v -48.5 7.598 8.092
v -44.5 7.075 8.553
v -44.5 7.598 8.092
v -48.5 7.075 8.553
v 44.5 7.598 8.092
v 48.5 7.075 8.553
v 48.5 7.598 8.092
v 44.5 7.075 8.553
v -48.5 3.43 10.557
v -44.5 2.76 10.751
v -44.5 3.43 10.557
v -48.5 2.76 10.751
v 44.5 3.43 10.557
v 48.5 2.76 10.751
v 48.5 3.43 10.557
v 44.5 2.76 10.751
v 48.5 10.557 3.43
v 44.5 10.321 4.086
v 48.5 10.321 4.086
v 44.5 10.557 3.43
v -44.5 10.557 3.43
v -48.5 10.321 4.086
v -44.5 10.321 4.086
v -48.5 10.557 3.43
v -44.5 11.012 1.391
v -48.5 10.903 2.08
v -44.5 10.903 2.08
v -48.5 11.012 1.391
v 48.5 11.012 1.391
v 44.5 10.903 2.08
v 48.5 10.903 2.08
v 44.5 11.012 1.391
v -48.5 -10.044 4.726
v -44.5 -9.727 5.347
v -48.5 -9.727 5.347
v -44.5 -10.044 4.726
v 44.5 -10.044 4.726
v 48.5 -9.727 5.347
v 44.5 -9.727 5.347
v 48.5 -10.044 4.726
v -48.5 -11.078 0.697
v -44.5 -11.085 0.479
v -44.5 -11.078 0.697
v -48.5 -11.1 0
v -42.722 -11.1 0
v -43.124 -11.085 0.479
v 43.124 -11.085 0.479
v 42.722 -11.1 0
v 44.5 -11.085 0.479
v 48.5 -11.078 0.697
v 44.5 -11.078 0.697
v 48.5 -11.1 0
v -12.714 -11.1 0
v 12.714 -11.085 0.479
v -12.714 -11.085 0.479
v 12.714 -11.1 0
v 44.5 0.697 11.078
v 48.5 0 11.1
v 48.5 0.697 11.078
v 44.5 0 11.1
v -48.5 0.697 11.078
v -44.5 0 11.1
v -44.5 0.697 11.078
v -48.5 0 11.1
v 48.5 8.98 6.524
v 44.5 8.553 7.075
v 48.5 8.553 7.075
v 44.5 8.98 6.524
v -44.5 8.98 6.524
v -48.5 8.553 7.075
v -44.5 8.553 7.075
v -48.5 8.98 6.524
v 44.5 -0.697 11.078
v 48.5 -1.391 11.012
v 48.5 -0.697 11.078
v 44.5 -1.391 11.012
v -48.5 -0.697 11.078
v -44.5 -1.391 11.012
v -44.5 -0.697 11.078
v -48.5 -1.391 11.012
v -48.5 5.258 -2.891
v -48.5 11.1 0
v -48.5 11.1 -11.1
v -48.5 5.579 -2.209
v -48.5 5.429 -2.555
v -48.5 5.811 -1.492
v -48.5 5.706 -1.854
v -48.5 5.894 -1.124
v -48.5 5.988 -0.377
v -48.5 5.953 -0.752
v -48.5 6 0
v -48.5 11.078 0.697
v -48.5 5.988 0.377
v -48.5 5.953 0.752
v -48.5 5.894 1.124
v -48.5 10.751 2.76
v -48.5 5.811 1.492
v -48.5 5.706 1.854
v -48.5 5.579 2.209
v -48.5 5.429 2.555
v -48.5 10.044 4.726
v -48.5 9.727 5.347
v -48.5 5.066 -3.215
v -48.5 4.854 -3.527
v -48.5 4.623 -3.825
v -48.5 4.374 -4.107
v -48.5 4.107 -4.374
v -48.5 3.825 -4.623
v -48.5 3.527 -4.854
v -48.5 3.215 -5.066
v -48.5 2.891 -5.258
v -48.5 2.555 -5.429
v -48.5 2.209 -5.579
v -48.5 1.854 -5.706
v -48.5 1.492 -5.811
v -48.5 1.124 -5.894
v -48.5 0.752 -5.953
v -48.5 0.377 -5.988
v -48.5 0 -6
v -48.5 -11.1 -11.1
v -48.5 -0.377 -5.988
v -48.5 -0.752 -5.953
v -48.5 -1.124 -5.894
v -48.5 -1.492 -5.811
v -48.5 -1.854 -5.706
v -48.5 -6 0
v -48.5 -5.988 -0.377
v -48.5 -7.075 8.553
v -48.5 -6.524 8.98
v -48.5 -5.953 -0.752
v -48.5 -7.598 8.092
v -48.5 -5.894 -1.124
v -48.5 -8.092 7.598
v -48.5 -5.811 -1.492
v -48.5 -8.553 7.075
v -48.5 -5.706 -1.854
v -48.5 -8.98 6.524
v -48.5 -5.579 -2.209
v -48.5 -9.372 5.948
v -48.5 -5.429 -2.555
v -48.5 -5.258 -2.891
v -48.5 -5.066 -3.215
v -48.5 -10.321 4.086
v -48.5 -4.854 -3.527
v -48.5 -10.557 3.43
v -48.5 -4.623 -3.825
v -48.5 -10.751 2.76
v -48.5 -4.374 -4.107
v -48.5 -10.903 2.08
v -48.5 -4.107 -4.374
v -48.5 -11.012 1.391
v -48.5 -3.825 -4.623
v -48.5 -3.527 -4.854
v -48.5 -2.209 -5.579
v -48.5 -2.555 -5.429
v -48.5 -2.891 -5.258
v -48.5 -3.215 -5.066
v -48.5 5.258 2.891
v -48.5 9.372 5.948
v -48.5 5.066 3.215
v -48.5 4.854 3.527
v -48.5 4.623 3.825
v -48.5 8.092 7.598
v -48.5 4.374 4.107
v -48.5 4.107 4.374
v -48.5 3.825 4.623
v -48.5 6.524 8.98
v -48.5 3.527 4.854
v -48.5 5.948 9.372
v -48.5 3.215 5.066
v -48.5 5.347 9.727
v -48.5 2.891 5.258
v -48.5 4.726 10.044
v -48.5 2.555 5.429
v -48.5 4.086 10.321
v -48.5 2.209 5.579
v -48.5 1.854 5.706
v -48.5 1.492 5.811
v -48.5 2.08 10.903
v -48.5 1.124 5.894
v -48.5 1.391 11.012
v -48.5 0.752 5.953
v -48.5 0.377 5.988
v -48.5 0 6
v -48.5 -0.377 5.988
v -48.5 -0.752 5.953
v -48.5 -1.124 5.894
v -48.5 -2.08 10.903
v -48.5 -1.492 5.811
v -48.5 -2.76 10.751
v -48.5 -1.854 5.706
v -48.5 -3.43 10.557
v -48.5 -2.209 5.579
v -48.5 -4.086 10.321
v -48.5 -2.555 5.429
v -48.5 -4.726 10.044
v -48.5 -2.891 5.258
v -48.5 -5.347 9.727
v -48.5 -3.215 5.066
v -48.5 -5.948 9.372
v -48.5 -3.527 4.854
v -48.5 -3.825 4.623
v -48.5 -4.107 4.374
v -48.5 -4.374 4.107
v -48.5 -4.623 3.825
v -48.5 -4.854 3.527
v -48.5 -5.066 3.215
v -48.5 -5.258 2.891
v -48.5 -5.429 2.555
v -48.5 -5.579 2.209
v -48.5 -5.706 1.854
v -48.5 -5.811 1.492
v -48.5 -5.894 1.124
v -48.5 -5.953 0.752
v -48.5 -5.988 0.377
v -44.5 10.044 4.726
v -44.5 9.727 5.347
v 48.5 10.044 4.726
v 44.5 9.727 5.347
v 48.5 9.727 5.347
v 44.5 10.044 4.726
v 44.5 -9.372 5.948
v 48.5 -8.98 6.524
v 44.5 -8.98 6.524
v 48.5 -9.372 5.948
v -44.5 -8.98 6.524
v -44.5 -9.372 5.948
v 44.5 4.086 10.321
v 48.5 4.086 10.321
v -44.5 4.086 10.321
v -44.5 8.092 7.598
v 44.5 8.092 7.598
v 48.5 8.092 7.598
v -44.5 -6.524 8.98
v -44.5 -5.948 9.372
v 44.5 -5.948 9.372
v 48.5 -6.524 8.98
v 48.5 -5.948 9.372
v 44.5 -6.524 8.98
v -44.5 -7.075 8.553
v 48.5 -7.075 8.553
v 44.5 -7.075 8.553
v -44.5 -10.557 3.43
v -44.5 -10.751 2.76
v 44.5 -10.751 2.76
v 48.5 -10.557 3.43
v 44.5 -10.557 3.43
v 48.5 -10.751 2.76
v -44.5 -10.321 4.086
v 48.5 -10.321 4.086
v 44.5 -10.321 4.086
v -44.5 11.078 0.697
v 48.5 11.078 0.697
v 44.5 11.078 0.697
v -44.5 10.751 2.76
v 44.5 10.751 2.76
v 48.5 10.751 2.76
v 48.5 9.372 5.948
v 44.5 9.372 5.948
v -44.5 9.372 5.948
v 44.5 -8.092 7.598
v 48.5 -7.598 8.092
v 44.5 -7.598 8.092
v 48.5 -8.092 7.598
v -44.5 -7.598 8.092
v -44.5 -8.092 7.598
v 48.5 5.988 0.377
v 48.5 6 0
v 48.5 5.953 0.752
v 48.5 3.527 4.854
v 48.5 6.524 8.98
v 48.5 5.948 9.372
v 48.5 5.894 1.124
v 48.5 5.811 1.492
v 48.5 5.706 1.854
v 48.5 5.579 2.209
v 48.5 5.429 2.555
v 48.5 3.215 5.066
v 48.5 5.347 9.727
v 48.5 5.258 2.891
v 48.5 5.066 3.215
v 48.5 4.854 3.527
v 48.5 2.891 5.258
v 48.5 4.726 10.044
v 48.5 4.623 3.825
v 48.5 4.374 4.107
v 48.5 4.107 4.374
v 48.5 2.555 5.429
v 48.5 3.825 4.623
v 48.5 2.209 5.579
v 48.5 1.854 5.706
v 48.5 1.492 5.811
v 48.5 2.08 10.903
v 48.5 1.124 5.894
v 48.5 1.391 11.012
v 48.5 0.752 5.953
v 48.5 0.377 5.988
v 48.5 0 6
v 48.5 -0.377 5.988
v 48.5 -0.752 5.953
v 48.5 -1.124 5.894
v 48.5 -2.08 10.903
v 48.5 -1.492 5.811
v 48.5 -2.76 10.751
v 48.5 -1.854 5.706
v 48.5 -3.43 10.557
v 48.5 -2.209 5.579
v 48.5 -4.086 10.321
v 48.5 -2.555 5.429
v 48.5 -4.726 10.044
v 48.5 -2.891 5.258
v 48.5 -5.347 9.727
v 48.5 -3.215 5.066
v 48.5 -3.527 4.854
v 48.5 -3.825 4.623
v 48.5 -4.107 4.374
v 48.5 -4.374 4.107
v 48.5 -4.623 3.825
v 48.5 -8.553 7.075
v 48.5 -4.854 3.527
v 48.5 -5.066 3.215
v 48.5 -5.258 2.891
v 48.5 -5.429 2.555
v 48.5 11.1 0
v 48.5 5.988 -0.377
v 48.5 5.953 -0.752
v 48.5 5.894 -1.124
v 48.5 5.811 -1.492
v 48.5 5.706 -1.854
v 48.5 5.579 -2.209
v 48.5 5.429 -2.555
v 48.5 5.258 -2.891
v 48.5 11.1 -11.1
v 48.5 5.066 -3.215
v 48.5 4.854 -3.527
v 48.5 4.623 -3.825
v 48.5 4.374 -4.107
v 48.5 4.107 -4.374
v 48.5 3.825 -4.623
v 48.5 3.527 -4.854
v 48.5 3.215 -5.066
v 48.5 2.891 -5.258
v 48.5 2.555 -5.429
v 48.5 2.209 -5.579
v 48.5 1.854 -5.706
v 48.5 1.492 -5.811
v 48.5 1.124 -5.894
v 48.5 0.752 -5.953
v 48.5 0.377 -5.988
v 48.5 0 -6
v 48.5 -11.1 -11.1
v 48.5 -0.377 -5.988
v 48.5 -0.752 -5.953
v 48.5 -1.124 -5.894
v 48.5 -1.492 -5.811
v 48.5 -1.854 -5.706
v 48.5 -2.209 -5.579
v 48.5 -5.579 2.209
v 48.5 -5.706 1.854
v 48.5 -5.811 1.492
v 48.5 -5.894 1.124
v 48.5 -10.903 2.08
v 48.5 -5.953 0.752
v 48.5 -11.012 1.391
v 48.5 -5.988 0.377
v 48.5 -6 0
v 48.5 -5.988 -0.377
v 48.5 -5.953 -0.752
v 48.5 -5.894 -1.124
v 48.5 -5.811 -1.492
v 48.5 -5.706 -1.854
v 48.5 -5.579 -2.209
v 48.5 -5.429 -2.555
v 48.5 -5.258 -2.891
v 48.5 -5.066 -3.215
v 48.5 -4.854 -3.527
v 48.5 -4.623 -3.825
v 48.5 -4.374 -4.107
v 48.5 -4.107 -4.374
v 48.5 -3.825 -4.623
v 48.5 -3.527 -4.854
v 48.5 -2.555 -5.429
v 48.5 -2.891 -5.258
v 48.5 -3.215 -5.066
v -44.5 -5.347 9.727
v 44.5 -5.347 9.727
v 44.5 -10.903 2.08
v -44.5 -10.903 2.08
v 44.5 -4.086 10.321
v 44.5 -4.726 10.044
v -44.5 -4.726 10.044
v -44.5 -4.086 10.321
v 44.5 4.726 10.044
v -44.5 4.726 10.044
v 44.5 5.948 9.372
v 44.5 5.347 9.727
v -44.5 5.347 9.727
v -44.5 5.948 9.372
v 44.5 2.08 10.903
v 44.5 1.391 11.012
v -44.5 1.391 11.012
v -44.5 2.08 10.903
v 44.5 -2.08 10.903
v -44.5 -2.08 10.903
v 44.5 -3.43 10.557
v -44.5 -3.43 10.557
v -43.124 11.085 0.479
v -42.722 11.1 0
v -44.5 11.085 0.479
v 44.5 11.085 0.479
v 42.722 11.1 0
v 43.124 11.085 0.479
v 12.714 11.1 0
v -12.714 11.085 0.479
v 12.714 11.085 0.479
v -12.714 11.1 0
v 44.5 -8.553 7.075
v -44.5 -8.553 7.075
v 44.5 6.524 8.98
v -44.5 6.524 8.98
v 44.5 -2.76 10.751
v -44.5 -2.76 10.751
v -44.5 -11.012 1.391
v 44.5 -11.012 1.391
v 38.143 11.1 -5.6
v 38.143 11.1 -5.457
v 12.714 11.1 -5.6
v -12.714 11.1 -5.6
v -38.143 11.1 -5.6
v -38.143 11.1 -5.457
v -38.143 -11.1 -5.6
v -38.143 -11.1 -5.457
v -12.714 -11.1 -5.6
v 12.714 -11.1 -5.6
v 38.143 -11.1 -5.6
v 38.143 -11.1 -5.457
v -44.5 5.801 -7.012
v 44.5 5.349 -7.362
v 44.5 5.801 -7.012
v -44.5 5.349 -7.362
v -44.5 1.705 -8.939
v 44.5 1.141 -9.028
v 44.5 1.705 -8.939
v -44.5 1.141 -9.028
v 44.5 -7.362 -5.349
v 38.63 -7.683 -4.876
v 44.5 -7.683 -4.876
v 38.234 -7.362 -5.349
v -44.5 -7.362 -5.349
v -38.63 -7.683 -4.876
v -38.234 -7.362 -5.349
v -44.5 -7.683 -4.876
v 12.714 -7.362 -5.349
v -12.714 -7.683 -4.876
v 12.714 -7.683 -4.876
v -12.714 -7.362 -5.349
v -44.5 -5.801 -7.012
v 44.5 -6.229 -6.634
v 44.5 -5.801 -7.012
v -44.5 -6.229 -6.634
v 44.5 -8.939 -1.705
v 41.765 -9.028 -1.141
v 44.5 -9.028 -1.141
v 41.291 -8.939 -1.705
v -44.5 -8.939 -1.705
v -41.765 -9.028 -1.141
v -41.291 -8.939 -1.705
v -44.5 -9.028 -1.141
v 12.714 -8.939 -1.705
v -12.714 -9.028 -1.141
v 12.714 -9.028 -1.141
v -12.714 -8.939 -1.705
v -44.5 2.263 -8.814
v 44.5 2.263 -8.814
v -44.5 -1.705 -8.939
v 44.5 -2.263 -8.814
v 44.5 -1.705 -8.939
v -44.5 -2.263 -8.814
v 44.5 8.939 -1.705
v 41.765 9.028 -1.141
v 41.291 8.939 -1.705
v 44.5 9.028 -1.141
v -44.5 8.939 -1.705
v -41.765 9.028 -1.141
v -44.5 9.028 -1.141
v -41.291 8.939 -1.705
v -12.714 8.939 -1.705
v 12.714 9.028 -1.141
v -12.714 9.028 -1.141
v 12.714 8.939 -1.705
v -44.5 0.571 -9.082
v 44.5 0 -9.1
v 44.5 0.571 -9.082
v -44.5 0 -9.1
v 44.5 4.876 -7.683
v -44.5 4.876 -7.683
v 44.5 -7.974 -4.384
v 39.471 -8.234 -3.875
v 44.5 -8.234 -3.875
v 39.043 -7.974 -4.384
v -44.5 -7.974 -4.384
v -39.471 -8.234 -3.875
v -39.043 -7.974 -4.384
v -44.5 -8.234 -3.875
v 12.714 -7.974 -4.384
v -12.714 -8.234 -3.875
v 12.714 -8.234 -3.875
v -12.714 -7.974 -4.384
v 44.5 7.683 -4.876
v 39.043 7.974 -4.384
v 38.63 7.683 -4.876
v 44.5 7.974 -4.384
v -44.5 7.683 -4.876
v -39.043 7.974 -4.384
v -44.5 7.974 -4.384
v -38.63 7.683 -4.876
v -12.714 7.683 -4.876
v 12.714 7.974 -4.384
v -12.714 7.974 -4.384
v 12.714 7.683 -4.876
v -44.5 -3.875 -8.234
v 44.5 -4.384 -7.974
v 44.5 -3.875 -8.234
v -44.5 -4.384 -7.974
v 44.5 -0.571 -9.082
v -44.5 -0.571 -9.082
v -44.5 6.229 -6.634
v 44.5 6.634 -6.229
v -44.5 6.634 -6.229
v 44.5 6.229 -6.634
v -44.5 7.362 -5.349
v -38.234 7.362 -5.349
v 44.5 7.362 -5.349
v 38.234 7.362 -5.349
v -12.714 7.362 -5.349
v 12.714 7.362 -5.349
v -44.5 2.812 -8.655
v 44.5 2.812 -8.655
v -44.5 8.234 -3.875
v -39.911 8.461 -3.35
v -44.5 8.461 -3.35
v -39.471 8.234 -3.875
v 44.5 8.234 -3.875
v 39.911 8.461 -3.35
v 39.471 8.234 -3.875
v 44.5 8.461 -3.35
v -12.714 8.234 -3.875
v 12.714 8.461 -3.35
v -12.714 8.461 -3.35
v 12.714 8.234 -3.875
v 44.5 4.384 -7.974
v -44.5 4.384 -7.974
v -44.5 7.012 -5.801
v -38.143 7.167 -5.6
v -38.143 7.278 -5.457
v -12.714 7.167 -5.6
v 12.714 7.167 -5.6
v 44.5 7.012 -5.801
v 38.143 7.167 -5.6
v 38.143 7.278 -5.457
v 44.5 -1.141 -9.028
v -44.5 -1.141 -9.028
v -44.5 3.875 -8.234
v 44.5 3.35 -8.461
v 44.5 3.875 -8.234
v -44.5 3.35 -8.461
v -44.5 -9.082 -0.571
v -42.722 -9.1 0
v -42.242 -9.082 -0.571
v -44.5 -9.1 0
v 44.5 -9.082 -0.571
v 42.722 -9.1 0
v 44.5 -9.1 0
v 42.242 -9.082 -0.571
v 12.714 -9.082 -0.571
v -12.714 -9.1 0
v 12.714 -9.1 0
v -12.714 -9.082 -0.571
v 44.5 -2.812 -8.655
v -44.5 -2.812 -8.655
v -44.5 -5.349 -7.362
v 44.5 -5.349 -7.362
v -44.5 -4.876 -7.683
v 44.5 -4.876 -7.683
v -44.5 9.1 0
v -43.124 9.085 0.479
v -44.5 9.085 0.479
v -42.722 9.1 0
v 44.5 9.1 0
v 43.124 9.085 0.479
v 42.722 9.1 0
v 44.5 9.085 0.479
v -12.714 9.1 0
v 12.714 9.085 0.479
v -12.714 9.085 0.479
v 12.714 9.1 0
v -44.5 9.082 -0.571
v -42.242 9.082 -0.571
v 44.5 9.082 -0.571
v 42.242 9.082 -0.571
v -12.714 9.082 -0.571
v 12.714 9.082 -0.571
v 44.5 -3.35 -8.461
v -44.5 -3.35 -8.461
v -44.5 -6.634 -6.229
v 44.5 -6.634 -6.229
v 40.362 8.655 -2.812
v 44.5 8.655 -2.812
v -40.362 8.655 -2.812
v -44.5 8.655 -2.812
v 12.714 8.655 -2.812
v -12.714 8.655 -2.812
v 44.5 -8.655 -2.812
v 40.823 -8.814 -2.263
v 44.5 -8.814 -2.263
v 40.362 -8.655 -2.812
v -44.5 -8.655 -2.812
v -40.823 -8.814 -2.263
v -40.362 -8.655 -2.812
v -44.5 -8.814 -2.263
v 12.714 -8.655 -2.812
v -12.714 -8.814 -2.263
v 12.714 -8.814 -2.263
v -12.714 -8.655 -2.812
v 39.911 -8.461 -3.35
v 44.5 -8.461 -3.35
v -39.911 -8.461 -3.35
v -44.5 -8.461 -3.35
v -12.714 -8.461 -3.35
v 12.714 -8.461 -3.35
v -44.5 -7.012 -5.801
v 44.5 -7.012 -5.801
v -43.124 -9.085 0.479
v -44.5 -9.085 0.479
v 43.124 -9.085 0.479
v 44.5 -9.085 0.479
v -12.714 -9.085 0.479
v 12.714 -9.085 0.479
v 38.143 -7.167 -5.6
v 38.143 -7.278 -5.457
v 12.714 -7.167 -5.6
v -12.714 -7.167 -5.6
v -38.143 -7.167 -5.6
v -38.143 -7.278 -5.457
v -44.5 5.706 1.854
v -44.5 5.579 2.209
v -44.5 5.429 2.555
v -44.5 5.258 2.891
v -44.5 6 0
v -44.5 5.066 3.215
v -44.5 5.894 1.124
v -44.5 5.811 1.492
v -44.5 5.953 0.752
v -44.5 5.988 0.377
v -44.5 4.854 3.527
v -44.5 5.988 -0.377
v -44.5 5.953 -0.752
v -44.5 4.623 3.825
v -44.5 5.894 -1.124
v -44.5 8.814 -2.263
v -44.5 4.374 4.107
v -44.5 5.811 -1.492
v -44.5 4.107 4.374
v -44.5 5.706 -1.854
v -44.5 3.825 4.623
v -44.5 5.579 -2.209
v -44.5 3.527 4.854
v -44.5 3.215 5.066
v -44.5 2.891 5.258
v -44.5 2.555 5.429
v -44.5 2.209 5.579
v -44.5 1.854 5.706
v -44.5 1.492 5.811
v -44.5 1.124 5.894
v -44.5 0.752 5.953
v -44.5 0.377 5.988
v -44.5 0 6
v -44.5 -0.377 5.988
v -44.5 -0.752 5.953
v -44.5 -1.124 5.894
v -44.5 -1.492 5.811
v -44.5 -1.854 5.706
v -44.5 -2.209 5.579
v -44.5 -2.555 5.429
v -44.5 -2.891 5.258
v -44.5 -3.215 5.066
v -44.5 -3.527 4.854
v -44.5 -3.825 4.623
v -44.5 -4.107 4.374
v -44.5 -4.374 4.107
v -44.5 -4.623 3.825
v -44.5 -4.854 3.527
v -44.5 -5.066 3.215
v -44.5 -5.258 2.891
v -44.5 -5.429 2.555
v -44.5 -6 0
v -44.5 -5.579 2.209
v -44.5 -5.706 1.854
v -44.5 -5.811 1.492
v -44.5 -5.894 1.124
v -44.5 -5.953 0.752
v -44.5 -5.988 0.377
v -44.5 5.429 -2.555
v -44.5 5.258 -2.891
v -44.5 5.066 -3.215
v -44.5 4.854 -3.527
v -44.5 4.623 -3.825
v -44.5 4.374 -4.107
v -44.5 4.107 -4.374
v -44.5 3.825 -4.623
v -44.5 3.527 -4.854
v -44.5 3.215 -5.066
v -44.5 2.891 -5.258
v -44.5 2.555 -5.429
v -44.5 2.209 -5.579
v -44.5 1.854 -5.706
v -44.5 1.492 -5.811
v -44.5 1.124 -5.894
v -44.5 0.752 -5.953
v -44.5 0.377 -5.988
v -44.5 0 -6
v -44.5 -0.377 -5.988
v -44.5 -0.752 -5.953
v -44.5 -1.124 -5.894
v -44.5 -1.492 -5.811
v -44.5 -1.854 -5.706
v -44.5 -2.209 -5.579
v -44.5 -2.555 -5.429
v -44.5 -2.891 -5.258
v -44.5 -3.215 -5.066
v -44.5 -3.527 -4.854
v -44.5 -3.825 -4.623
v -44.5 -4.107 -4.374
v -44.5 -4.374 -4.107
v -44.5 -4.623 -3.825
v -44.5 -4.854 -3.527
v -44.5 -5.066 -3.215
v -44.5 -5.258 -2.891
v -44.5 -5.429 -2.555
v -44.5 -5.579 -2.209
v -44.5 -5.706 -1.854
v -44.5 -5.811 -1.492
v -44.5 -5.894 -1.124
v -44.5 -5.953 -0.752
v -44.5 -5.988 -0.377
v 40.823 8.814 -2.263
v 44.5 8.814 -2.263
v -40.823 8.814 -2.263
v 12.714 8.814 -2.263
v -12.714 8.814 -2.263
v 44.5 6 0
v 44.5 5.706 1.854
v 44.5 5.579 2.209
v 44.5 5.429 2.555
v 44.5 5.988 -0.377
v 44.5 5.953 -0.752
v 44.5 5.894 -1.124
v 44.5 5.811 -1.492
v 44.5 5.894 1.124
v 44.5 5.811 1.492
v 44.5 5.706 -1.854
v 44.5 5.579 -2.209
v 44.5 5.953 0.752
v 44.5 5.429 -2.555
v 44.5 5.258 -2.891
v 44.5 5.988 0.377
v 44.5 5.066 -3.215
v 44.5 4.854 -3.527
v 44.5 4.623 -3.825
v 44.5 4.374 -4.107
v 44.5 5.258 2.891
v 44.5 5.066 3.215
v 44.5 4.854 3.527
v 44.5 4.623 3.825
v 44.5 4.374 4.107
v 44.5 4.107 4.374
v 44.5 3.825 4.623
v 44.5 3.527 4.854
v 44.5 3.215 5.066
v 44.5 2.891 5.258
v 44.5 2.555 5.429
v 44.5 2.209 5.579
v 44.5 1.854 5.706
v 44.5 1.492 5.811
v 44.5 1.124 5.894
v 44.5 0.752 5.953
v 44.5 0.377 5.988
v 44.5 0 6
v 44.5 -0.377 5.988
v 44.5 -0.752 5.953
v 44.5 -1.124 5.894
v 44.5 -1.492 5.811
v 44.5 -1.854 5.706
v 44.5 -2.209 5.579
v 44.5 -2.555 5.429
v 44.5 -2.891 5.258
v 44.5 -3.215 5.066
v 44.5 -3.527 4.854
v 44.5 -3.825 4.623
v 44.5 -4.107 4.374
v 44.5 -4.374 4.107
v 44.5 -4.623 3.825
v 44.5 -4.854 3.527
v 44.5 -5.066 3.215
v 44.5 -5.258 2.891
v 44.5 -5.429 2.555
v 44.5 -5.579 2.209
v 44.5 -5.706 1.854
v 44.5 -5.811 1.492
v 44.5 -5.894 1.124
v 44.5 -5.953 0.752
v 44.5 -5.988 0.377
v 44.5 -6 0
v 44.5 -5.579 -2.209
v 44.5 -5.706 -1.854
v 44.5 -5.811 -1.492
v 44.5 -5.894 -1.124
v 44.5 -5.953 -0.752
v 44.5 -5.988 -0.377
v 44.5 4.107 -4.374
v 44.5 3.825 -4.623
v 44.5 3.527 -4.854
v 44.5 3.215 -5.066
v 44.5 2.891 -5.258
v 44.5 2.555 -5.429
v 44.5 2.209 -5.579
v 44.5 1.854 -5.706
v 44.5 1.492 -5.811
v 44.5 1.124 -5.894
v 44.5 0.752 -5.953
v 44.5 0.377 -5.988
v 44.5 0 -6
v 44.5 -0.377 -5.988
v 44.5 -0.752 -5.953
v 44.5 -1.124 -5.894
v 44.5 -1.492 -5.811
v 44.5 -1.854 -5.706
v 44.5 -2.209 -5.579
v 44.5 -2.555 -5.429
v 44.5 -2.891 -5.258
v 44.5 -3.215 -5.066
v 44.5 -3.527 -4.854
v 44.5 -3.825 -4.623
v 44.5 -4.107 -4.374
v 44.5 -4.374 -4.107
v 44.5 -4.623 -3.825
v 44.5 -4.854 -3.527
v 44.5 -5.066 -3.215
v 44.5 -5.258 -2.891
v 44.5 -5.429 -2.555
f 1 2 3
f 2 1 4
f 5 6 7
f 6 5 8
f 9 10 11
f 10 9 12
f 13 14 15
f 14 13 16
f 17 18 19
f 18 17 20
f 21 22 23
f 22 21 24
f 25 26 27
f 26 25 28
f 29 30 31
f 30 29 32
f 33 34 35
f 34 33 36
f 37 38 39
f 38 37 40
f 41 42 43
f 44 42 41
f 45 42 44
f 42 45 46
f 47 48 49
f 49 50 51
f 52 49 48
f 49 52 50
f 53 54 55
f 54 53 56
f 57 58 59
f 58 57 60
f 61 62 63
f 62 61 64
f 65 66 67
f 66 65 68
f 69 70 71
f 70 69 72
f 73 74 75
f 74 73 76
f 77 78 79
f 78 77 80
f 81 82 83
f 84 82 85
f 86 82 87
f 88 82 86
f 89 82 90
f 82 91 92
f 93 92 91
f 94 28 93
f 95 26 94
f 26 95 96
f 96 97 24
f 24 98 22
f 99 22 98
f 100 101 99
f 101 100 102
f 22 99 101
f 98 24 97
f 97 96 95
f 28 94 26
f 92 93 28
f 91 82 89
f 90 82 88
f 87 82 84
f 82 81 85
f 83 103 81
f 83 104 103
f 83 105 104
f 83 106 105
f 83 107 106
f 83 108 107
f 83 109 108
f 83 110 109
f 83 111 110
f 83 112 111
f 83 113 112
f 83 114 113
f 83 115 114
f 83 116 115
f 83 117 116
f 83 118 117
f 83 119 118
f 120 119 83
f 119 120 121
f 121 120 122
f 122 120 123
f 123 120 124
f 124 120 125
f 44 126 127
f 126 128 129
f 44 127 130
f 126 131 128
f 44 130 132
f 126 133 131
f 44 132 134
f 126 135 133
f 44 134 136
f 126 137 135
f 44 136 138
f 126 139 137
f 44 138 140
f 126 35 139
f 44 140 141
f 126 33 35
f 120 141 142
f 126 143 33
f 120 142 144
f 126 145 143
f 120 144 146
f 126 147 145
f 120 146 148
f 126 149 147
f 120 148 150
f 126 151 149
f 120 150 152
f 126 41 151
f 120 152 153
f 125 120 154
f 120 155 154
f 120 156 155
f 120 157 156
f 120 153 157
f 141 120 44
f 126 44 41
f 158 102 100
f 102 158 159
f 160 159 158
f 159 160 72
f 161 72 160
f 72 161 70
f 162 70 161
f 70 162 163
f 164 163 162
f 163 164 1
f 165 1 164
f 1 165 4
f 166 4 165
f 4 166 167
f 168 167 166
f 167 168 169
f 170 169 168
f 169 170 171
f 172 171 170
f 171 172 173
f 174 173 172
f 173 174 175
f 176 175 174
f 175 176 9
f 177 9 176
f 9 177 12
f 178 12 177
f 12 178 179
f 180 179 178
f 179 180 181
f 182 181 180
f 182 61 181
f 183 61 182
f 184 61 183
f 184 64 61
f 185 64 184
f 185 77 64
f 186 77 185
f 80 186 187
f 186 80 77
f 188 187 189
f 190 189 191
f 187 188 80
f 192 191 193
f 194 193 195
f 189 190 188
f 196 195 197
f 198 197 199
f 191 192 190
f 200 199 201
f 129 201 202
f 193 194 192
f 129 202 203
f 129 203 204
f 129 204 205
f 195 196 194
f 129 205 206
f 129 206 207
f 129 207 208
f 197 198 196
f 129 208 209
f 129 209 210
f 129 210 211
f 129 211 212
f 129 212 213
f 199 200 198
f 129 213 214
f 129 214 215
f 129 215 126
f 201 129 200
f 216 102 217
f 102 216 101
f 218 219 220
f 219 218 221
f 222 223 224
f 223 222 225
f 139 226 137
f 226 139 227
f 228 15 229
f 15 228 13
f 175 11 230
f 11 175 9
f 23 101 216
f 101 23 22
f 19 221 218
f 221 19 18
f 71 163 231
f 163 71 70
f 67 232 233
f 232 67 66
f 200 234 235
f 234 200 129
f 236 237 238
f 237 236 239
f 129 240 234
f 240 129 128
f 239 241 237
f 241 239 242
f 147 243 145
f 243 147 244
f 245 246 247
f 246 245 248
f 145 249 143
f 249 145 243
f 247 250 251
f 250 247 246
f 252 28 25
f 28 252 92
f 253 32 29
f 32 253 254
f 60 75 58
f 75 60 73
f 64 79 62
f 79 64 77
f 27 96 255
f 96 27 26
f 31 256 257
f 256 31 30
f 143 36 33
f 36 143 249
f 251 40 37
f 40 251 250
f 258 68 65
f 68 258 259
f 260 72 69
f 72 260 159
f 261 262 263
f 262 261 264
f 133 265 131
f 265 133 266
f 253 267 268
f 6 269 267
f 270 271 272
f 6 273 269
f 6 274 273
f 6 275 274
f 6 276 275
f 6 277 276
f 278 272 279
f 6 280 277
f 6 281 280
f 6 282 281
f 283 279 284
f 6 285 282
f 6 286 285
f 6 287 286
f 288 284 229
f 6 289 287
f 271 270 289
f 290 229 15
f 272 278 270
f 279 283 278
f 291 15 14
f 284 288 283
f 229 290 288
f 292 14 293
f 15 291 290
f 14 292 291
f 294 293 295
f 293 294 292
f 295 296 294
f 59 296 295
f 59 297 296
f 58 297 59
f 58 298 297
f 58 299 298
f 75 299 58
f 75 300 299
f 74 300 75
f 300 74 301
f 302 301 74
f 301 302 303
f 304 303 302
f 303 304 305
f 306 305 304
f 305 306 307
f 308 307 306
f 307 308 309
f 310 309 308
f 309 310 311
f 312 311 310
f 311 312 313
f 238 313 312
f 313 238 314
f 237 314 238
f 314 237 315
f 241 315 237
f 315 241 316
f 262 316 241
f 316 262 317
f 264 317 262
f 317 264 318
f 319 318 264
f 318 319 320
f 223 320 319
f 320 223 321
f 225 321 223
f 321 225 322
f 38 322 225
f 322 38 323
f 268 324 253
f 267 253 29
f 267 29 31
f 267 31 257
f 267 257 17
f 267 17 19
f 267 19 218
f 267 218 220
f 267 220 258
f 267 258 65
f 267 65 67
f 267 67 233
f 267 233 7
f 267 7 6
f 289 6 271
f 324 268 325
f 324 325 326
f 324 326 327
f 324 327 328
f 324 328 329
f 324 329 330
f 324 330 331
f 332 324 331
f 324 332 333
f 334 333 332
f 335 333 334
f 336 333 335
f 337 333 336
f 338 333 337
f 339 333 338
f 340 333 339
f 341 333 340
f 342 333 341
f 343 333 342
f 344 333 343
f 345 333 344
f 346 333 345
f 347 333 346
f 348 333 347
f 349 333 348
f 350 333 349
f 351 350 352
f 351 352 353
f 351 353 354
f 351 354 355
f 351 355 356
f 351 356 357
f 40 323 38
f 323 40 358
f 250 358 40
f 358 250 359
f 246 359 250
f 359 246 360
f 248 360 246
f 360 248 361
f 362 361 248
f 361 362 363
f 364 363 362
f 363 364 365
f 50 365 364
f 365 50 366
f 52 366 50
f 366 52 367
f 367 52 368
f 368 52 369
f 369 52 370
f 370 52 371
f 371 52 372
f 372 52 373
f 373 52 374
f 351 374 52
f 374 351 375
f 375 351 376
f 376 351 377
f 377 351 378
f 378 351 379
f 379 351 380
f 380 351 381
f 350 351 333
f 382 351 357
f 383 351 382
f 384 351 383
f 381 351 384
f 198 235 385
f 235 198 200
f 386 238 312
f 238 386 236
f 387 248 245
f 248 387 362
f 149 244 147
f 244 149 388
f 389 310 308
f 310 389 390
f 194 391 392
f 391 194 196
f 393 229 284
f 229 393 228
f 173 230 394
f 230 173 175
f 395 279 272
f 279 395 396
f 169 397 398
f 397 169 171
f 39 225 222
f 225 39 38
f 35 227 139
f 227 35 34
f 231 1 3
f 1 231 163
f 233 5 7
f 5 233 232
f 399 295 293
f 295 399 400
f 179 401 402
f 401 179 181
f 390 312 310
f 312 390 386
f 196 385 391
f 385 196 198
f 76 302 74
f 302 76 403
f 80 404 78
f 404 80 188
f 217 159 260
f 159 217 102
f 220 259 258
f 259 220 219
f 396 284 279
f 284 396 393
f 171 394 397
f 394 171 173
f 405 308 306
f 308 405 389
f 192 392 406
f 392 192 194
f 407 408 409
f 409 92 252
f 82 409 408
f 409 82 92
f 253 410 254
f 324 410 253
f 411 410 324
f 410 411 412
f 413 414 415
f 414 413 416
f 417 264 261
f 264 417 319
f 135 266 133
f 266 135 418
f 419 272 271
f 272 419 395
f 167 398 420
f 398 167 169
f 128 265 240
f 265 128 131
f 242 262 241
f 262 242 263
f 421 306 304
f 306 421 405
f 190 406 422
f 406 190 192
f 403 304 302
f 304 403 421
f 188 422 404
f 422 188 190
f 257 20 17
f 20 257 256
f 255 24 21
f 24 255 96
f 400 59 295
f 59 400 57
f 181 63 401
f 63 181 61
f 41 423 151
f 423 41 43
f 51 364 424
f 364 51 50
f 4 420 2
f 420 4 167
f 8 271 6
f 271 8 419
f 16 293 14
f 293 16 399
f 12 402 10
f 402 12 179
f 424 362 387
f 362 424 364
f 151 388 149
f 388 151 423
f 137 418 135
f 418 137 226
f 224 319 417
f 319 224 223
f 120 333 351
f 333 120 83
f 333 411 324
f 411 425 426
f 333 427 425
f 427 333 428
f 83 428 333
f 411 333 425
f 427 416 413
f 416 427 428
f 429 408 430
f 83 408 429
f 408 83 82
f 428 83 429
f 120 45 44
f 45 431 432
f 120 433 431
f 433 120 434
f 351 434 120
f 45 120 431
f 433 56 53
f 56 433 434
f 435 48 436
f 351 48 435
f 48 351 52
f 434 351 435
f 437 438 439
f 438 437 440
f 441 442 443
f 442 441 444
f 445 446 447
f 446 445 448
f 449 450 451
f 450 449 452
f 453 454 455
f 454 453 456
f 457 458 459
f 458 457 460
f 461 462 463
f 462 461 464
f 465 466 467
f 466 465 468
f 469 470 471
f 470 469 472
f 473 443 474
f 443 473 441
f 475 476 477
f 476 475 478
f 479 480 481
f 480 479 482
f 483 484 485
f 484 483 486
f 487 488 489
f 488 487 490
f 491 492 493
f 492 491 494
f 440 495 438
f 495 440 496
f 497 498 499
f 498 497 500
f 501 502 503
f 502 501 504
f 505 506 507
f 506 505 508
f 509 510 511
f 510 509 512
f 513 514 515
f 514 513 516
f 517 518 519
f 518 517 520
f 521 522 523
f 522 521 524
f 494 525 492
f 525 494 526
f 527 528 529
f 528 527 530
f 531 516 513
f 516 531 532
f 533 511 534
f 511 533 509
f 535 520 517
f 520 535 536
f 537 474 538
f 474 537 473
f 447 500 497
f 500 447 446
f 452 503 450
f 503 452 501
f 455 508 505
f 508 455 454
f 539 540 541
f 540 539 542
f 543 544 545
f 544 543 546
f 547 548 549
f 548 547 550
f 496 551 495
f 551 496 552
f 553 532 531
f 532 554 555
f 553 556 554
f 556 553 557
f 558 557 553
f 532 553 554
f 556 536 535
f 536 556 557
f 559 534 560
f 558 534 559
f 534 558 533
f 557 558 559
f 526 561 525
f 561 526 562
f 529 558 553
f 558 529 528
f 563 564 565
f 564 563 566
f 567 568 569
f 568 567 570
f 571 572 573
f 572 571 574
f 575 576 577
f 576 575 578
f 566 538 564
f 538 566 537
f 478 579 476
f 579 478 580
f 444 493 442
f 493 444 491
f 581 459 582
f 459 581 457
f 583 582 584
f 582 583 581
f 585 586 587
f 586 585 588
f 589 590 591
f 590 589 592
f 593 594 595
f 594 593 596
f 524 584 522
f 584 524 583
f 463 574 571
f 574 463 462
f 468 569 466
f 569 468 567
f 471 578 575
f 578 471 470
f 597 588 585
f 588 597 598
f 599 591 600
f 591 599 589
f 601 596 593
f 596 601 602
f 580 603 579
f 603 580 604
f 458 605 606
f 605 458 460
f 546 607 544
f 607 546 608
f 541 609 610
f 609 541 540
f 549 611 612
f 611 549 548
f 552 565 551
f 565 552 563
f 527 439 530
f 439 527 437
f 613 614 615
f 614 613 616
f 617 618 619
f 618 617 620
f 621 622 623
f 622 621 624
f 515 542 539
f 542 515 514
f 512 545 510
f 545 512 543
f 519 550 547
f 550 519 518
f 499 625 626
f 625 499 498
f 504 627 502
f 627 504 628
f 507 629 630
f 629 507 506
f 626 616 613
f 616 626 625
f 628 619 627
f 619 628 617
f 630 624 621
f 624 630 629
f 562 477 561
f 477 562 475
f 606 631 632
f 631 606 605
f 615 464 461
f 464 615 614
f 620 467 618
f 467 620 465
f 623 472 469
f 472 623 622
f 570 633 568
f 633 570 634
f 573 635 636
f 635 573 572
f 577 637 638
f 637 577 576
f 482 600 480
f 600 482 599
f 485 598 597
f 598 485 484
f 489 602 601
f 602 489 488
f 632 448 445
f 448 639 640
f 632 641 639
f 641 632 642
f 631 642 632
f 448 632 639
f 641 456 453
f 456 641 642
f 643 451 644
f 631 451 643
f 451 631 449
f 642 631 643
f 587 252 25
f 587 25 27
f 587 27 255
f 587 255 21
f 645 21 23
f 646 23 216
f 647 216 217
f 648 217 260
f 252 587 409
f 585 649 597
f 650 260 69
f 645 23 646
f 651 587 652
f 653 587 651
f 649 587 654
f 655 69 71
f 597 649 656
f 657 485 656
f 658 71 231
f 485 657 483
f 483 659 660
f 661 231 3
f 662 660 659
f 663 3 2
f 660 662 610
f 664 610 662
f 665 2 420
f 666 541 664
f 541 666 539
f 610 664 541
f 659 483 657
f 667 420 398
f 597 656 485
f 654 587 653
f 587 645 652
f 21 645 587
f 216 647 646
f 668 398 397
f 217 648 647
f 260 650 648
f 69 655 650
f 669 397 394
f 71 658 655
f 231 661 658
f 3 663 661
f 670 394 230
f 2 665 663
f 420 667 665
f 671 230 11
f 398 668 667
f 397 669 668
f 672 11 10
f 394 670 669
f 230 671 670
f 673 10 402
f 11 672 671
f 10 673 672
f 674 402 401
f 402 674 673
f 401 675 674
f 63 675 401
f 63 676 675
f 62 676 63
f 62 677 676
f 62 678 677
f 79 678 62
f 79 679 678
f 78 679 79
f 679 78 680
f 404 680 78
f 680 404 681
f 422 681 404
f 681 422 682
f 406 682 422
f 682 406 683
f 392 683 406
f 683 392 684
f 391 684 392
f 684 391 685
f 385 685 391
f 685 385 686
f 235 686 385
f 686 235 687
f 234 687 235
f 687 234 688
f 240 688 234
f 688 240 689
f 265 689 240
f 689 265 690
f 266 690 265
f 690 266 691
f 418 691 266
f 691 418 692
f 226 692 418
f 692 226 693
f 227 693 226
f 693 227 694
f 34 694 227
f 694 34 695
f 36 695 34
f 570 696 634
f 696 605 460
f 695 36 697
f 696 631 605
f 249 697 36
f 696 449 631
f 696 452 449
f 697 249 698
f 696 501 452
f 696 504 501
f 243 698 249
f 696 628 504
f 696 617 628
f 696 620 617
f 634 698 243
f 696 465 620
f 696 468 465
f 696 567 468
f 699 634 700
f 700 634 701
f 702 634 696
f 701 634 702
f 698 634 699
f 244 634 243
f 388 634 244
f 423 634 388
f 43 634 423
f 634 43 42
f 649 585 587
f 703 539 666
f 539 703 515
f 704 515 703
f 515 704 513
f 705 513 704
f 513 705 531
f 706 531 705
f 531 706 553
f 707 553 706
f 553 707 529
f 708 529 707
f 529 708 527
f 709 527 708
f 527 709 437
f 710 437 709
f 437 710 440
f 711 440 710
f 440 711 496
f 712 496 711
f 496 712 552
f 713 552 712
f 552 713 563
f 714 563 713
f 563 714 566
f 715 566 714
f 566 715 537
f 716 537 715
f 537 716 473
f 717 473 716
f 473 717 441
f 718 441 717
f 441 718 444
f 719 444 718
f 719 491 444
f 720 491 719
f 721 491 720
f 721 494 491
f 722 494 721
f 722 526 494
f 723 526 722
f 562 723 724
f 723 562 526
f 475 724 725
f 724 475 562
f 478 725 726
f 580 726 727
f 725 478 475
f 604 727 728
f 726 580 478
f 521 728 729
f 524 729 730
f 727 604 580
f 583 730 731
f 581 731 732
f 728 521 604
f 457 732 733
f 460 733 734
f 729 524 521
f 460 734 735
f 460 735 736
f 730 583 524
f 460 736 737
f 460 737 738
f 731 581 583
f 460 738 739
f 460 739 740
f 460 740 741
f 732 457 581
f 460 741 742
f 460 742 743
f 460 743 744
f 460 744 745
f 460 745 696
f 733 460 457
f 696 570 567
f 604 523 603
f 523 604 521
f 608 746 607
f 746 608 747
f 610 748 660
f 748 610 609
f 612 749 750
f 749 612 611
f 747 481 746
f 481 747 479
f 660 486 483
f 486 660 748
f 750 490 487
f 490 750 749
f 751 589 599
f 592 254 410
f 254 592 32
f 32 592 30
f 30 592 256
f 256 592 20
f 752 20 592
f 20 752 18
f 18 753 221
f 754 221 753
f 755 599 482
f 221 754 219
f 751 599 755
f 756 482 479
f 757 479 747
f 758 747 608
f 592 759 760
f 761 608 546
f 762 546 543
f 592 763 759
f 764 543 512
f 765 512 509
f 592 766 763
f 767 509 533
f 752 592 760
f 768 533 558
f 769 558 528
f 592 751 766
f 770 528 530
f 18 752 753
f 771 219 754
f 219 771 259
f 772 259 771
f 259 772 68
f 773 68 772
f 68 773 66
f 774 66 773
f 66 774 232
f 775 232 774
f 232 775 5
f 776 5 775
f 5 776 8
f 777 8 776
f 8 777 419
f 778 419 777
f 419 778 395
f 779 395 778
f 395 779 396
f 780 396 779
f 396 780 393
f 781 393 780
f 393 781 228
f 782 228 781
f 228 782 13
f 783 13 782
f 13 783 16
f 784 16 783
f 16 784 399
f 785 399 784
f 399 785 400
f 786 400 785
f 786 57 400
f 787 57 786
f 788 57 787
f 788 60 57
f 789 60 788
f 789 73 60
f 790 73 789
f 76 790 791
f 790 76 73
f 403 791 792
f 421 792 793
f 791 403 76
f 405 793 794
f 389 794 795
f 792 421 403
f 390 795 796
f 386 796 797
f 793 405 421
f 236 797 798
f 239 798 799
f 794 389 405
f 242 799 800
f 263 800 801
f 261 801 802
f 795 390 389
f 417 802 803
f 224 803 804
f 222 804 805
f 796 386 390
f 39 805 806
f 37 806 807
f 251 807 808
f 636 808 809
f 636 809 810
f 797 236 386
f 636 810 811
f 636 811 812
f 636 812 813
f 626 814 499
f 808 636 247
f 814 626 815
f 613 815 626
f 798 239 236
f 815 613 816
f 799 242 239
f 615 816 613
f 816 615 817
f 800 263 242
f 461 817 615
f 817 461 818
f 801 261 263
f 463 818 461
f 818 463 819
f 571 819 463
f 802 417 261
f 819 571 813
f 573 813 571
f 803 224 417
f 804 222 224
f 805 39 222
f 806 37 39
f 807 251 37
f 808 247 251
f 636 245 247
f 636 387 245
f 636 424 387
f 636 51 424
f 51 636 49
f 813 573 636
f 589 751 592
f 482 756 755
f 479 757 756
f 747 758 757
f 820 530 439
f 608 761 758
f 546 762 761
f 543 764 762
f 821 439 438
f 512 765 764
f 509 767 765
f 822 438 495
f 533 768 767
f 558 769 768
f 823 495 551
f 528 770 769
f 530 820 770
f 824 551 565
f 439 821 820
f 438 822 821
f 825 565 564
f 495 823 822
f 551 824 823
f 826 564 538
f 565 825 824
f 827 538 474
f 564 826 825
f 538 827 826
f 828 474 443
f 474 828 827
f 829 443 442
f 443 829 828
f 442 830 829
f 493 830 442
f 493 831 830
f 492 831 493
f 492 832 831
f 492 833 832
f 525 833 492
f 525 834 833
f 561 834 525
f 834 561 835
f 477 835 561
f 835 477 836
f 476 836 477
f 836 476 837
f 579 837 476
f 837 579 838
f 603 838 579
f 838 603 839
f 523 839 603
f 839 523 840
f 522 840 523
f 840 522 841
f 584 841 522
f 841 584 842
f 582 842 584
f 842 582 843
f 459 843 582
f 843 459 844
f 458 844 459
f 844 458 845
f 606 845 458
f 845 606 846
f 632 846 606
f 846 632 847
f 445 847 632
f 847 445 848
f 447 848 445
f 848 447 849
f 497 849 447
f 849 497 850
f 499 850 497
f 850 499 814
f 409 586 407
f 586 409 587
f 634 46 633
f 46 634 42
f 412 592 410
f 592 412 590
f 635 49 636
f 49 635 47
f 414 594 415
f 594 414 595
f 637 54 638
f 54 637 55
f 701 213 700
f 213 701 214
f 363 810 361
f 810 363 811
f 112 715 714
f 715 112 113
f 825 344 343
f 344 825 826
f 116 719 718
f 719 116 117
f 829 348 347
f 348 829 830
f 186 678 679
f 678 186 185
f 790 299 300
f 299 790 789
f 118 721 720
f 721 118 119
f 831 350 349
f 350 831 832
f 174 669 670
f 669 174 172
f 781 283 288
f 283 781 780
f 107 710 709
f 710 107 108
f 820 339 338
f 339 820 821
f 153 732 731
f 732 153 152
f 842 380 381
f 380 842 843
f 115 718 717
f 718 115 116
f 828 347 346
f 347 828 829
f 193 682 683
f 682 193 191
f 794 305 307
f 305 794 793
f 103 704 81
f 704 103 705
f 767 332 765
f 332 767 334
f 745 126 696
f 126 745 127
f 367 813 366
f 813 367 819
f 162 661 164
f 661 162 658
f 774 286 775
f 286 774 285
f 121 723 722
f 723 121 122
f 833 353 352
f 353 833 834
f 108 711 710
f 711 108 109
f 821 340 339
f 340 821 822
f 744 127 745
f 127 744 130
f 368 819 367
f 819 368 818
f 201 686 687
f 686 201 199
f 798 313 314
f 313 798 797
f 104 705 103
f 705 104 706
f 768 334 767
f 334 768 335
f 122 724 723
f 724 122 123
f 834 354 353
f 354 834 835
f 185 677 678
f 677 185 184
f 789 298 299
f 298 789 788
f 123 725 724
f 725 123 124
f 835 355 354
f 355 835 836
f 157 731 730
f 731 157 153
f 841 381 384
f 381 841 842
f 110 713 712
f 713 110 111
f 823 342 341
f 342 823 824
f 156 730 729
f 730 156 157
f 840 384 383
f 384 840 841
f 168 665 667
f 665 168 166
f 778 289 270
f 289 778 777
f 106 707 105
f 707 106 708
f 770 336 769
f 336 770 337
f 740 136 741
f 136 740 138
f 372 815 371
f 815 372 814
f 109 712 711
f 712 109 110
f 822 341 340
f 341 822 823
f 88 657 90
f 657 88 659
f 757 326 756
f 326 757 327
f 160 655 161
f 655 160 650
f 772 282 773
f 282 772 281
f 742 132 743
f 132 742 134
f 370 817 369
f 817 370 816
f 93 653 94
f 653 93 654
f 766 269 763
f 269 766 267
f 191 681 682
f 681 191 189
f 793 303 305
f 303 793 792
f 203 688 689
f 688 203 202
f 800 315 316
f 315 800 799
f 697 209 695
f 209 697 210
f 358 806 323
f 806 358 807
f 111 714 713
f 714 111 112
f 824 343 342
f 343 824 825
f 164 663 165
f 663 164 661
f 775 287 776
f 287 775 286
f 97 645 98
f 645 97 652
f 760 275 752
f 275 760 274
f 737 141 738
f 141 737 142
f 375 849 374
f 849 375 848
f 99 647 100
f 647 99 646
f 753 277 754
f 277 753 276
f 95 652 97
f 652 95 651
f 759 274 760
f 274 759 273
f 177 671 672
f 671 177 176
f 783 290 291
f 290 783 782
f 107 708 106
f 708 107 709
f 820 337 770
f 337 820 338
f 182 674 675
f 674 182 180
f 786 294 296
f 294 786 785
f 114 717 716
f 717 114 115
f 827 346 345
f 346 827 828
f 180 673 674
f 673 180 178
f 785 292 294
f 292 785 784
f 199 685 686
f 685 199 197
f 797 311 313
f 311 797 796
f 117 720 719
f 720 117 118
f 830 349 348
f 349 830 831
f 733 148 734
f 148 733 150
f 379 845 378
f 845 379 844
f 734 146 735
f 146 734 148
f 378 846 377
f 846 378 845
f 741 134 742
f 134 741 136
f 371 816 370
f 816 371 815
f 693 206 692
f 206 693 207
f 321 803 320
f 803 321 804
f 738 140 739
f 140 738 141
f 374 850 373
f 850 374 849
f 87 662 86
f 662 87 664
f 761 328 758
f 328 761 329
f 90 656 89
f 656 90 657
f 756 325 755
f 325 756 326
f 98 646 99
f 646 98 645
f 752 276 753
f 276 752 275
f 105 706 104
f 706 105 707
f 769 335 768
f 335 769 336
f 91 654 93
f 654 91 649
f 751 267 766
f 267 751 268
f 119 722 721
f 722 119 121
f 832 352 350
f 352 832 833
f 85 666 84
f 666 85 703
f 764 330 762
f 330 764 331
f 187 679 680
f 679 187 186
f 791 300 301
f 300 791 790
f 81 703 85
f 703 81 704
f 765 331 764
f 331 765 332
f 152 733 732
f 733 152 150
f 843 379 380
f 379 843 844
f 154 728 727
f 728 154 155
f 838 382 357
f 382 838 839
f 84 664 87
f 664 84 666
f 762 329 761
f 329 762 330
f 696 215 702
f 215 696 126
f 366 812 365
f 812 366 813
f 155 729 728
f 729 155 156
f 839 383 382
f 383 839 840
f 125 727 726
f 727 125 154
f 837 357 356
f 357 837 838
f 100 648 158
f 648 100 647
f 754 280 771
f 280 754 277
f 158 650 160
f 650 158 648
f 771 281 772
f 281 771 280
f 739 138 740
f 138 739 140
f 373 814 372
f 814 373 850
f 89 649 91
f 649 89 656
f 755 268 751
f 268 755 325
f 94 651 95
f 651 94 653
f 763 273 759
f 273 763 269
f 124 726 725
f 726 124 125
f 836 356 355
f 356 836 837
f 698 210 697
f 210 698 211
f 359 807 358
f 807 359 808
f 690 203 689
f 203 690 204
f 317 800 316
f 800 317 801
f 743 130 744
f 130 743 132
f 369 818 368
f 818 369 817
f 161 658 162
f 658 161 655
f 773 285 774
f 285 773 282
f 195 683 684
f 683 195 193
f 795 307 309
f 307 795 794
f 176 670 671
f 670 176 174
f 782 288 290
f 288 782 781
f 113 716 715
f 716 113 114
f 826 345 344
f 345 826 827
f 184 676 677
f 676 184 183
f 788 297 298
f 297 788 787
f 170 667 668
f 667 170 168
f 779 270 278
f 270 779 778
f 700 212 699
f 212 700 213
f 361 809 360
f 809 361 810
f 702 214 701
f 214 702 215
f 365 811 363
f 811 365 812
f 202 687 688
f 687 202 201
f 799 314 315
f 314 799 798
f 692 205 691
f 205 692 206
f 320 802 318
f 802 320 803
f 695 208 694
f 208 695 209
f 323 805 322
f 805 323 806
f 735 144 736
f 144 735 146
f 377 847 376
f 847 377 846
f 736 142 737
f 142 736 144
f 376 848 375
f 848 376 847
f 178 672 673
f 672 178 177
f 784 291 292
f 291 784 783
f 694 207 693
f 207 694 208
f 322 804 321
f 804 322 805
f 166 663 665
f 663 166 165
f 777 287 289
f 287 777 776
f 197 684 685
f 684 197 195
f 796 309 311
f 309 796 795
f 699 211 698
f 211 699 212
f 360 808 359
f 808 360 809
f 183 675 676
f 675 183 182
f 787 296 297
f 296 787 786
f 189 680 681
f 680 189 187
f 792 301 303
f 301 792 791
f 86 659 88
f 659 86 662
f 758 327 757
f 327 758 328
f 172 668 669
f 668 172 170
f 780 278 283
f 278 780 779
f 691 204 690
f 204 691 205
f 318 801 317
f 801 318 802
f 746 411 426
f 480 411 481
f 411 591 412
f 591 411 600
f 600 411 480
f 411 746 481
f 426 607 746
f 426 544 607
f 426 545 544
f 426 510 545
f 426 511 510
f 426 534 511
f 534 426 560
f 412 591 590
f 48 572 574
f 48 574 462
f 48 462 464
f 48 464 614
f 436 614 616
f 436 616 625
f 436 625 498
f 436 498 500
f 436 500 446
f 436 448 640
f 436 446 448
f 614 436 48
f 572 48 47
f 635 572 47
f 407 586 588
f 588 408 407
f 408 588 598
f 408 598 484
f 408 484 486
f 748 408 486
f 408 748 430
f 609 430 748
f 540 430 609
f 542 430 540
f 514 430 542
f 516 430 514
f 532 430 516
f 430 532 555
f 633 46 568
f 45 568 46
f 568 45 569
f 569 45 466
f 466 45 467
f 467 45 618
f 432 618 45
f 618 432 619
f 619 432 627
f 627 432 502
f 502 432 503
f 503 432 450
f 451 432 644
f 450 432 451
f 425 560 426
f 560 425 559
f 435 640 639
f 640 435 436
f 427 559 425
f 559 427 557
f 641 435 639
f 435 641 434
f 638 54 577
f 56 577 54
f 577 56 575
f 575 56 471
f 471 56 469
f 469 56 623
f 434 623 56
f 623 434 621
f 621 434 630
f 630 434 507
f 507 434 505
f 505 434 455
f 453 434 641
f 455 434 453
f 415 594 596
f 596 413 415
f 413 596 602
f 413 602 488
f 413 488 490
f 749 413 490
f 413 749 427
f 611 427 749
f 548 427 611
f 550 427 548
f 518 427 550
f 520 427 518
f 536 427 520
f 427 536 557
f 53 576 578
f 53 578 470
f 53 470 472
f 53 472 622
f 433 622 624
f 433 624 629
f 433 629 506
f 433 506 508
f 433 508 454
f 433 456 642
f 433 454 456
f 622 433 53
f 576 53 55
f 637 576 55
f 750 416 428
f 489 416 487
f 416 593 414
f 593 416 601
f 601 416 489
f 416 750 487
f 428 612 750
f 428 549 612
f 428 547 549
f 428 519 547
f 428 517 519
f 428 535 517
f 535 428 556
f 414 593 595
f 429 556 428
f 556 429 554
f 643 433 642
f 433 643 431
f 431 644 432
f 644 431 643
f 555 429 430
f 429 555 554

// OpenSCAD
module xhole(radius, length) {
	rotate(a=[0,90,0]) cylinder(r=radius,h=length+1,center=true, $fn=100);
}

module batteryClip(width, length, thickness,end_thickness) {
	difference() {
		union() {
			rotate([0,90,0]) cylinder(r=thickness+width/2,h=2*end_thickness+length,$fn=30,center=true,,$fn=100);
			translate([0,0,-thickness/2-width/4]) cube([2*end_thickness+length,2*thickness+width,thickness+width/2], center=true);
		}
		#rotate([0,90,0]) cylinder(r=width/2,h=length,$fn=30,center=true,$fn=100);
		translate([0,0,width/1.9]) cube([length,width+2*thickness+1,width],center=true);

		translate([0,0,0]) xhole(12/2,length+2*end_thickness+1);
		//translate([0,-1.5,0]) xhole(.75,length+2*thickness+1);
        translate([length/2.37,0,0]) rotate([90,-5,0])cylinder(d=width-7,h=width+2*thickness+1,center=true, $fn=4);
        translate([-length/2.37,0,0]) rotate([90,5,0])cylinder(d=width-7,h=width+2*thickness+1,center=true, $fn=4);
		translate([length/3.5,0,0]) cube([length/3.5,width+2*thickness+1,width-7], center=true);
		translate([-length/3.5,0,0]) cube([length/3.5,width+2*thickness+1,width-7], center=true);
	}
}
//18650 (tester, 9mm at +, 15mm at -
batteryClip(18.2,65+9+15,2,4);
